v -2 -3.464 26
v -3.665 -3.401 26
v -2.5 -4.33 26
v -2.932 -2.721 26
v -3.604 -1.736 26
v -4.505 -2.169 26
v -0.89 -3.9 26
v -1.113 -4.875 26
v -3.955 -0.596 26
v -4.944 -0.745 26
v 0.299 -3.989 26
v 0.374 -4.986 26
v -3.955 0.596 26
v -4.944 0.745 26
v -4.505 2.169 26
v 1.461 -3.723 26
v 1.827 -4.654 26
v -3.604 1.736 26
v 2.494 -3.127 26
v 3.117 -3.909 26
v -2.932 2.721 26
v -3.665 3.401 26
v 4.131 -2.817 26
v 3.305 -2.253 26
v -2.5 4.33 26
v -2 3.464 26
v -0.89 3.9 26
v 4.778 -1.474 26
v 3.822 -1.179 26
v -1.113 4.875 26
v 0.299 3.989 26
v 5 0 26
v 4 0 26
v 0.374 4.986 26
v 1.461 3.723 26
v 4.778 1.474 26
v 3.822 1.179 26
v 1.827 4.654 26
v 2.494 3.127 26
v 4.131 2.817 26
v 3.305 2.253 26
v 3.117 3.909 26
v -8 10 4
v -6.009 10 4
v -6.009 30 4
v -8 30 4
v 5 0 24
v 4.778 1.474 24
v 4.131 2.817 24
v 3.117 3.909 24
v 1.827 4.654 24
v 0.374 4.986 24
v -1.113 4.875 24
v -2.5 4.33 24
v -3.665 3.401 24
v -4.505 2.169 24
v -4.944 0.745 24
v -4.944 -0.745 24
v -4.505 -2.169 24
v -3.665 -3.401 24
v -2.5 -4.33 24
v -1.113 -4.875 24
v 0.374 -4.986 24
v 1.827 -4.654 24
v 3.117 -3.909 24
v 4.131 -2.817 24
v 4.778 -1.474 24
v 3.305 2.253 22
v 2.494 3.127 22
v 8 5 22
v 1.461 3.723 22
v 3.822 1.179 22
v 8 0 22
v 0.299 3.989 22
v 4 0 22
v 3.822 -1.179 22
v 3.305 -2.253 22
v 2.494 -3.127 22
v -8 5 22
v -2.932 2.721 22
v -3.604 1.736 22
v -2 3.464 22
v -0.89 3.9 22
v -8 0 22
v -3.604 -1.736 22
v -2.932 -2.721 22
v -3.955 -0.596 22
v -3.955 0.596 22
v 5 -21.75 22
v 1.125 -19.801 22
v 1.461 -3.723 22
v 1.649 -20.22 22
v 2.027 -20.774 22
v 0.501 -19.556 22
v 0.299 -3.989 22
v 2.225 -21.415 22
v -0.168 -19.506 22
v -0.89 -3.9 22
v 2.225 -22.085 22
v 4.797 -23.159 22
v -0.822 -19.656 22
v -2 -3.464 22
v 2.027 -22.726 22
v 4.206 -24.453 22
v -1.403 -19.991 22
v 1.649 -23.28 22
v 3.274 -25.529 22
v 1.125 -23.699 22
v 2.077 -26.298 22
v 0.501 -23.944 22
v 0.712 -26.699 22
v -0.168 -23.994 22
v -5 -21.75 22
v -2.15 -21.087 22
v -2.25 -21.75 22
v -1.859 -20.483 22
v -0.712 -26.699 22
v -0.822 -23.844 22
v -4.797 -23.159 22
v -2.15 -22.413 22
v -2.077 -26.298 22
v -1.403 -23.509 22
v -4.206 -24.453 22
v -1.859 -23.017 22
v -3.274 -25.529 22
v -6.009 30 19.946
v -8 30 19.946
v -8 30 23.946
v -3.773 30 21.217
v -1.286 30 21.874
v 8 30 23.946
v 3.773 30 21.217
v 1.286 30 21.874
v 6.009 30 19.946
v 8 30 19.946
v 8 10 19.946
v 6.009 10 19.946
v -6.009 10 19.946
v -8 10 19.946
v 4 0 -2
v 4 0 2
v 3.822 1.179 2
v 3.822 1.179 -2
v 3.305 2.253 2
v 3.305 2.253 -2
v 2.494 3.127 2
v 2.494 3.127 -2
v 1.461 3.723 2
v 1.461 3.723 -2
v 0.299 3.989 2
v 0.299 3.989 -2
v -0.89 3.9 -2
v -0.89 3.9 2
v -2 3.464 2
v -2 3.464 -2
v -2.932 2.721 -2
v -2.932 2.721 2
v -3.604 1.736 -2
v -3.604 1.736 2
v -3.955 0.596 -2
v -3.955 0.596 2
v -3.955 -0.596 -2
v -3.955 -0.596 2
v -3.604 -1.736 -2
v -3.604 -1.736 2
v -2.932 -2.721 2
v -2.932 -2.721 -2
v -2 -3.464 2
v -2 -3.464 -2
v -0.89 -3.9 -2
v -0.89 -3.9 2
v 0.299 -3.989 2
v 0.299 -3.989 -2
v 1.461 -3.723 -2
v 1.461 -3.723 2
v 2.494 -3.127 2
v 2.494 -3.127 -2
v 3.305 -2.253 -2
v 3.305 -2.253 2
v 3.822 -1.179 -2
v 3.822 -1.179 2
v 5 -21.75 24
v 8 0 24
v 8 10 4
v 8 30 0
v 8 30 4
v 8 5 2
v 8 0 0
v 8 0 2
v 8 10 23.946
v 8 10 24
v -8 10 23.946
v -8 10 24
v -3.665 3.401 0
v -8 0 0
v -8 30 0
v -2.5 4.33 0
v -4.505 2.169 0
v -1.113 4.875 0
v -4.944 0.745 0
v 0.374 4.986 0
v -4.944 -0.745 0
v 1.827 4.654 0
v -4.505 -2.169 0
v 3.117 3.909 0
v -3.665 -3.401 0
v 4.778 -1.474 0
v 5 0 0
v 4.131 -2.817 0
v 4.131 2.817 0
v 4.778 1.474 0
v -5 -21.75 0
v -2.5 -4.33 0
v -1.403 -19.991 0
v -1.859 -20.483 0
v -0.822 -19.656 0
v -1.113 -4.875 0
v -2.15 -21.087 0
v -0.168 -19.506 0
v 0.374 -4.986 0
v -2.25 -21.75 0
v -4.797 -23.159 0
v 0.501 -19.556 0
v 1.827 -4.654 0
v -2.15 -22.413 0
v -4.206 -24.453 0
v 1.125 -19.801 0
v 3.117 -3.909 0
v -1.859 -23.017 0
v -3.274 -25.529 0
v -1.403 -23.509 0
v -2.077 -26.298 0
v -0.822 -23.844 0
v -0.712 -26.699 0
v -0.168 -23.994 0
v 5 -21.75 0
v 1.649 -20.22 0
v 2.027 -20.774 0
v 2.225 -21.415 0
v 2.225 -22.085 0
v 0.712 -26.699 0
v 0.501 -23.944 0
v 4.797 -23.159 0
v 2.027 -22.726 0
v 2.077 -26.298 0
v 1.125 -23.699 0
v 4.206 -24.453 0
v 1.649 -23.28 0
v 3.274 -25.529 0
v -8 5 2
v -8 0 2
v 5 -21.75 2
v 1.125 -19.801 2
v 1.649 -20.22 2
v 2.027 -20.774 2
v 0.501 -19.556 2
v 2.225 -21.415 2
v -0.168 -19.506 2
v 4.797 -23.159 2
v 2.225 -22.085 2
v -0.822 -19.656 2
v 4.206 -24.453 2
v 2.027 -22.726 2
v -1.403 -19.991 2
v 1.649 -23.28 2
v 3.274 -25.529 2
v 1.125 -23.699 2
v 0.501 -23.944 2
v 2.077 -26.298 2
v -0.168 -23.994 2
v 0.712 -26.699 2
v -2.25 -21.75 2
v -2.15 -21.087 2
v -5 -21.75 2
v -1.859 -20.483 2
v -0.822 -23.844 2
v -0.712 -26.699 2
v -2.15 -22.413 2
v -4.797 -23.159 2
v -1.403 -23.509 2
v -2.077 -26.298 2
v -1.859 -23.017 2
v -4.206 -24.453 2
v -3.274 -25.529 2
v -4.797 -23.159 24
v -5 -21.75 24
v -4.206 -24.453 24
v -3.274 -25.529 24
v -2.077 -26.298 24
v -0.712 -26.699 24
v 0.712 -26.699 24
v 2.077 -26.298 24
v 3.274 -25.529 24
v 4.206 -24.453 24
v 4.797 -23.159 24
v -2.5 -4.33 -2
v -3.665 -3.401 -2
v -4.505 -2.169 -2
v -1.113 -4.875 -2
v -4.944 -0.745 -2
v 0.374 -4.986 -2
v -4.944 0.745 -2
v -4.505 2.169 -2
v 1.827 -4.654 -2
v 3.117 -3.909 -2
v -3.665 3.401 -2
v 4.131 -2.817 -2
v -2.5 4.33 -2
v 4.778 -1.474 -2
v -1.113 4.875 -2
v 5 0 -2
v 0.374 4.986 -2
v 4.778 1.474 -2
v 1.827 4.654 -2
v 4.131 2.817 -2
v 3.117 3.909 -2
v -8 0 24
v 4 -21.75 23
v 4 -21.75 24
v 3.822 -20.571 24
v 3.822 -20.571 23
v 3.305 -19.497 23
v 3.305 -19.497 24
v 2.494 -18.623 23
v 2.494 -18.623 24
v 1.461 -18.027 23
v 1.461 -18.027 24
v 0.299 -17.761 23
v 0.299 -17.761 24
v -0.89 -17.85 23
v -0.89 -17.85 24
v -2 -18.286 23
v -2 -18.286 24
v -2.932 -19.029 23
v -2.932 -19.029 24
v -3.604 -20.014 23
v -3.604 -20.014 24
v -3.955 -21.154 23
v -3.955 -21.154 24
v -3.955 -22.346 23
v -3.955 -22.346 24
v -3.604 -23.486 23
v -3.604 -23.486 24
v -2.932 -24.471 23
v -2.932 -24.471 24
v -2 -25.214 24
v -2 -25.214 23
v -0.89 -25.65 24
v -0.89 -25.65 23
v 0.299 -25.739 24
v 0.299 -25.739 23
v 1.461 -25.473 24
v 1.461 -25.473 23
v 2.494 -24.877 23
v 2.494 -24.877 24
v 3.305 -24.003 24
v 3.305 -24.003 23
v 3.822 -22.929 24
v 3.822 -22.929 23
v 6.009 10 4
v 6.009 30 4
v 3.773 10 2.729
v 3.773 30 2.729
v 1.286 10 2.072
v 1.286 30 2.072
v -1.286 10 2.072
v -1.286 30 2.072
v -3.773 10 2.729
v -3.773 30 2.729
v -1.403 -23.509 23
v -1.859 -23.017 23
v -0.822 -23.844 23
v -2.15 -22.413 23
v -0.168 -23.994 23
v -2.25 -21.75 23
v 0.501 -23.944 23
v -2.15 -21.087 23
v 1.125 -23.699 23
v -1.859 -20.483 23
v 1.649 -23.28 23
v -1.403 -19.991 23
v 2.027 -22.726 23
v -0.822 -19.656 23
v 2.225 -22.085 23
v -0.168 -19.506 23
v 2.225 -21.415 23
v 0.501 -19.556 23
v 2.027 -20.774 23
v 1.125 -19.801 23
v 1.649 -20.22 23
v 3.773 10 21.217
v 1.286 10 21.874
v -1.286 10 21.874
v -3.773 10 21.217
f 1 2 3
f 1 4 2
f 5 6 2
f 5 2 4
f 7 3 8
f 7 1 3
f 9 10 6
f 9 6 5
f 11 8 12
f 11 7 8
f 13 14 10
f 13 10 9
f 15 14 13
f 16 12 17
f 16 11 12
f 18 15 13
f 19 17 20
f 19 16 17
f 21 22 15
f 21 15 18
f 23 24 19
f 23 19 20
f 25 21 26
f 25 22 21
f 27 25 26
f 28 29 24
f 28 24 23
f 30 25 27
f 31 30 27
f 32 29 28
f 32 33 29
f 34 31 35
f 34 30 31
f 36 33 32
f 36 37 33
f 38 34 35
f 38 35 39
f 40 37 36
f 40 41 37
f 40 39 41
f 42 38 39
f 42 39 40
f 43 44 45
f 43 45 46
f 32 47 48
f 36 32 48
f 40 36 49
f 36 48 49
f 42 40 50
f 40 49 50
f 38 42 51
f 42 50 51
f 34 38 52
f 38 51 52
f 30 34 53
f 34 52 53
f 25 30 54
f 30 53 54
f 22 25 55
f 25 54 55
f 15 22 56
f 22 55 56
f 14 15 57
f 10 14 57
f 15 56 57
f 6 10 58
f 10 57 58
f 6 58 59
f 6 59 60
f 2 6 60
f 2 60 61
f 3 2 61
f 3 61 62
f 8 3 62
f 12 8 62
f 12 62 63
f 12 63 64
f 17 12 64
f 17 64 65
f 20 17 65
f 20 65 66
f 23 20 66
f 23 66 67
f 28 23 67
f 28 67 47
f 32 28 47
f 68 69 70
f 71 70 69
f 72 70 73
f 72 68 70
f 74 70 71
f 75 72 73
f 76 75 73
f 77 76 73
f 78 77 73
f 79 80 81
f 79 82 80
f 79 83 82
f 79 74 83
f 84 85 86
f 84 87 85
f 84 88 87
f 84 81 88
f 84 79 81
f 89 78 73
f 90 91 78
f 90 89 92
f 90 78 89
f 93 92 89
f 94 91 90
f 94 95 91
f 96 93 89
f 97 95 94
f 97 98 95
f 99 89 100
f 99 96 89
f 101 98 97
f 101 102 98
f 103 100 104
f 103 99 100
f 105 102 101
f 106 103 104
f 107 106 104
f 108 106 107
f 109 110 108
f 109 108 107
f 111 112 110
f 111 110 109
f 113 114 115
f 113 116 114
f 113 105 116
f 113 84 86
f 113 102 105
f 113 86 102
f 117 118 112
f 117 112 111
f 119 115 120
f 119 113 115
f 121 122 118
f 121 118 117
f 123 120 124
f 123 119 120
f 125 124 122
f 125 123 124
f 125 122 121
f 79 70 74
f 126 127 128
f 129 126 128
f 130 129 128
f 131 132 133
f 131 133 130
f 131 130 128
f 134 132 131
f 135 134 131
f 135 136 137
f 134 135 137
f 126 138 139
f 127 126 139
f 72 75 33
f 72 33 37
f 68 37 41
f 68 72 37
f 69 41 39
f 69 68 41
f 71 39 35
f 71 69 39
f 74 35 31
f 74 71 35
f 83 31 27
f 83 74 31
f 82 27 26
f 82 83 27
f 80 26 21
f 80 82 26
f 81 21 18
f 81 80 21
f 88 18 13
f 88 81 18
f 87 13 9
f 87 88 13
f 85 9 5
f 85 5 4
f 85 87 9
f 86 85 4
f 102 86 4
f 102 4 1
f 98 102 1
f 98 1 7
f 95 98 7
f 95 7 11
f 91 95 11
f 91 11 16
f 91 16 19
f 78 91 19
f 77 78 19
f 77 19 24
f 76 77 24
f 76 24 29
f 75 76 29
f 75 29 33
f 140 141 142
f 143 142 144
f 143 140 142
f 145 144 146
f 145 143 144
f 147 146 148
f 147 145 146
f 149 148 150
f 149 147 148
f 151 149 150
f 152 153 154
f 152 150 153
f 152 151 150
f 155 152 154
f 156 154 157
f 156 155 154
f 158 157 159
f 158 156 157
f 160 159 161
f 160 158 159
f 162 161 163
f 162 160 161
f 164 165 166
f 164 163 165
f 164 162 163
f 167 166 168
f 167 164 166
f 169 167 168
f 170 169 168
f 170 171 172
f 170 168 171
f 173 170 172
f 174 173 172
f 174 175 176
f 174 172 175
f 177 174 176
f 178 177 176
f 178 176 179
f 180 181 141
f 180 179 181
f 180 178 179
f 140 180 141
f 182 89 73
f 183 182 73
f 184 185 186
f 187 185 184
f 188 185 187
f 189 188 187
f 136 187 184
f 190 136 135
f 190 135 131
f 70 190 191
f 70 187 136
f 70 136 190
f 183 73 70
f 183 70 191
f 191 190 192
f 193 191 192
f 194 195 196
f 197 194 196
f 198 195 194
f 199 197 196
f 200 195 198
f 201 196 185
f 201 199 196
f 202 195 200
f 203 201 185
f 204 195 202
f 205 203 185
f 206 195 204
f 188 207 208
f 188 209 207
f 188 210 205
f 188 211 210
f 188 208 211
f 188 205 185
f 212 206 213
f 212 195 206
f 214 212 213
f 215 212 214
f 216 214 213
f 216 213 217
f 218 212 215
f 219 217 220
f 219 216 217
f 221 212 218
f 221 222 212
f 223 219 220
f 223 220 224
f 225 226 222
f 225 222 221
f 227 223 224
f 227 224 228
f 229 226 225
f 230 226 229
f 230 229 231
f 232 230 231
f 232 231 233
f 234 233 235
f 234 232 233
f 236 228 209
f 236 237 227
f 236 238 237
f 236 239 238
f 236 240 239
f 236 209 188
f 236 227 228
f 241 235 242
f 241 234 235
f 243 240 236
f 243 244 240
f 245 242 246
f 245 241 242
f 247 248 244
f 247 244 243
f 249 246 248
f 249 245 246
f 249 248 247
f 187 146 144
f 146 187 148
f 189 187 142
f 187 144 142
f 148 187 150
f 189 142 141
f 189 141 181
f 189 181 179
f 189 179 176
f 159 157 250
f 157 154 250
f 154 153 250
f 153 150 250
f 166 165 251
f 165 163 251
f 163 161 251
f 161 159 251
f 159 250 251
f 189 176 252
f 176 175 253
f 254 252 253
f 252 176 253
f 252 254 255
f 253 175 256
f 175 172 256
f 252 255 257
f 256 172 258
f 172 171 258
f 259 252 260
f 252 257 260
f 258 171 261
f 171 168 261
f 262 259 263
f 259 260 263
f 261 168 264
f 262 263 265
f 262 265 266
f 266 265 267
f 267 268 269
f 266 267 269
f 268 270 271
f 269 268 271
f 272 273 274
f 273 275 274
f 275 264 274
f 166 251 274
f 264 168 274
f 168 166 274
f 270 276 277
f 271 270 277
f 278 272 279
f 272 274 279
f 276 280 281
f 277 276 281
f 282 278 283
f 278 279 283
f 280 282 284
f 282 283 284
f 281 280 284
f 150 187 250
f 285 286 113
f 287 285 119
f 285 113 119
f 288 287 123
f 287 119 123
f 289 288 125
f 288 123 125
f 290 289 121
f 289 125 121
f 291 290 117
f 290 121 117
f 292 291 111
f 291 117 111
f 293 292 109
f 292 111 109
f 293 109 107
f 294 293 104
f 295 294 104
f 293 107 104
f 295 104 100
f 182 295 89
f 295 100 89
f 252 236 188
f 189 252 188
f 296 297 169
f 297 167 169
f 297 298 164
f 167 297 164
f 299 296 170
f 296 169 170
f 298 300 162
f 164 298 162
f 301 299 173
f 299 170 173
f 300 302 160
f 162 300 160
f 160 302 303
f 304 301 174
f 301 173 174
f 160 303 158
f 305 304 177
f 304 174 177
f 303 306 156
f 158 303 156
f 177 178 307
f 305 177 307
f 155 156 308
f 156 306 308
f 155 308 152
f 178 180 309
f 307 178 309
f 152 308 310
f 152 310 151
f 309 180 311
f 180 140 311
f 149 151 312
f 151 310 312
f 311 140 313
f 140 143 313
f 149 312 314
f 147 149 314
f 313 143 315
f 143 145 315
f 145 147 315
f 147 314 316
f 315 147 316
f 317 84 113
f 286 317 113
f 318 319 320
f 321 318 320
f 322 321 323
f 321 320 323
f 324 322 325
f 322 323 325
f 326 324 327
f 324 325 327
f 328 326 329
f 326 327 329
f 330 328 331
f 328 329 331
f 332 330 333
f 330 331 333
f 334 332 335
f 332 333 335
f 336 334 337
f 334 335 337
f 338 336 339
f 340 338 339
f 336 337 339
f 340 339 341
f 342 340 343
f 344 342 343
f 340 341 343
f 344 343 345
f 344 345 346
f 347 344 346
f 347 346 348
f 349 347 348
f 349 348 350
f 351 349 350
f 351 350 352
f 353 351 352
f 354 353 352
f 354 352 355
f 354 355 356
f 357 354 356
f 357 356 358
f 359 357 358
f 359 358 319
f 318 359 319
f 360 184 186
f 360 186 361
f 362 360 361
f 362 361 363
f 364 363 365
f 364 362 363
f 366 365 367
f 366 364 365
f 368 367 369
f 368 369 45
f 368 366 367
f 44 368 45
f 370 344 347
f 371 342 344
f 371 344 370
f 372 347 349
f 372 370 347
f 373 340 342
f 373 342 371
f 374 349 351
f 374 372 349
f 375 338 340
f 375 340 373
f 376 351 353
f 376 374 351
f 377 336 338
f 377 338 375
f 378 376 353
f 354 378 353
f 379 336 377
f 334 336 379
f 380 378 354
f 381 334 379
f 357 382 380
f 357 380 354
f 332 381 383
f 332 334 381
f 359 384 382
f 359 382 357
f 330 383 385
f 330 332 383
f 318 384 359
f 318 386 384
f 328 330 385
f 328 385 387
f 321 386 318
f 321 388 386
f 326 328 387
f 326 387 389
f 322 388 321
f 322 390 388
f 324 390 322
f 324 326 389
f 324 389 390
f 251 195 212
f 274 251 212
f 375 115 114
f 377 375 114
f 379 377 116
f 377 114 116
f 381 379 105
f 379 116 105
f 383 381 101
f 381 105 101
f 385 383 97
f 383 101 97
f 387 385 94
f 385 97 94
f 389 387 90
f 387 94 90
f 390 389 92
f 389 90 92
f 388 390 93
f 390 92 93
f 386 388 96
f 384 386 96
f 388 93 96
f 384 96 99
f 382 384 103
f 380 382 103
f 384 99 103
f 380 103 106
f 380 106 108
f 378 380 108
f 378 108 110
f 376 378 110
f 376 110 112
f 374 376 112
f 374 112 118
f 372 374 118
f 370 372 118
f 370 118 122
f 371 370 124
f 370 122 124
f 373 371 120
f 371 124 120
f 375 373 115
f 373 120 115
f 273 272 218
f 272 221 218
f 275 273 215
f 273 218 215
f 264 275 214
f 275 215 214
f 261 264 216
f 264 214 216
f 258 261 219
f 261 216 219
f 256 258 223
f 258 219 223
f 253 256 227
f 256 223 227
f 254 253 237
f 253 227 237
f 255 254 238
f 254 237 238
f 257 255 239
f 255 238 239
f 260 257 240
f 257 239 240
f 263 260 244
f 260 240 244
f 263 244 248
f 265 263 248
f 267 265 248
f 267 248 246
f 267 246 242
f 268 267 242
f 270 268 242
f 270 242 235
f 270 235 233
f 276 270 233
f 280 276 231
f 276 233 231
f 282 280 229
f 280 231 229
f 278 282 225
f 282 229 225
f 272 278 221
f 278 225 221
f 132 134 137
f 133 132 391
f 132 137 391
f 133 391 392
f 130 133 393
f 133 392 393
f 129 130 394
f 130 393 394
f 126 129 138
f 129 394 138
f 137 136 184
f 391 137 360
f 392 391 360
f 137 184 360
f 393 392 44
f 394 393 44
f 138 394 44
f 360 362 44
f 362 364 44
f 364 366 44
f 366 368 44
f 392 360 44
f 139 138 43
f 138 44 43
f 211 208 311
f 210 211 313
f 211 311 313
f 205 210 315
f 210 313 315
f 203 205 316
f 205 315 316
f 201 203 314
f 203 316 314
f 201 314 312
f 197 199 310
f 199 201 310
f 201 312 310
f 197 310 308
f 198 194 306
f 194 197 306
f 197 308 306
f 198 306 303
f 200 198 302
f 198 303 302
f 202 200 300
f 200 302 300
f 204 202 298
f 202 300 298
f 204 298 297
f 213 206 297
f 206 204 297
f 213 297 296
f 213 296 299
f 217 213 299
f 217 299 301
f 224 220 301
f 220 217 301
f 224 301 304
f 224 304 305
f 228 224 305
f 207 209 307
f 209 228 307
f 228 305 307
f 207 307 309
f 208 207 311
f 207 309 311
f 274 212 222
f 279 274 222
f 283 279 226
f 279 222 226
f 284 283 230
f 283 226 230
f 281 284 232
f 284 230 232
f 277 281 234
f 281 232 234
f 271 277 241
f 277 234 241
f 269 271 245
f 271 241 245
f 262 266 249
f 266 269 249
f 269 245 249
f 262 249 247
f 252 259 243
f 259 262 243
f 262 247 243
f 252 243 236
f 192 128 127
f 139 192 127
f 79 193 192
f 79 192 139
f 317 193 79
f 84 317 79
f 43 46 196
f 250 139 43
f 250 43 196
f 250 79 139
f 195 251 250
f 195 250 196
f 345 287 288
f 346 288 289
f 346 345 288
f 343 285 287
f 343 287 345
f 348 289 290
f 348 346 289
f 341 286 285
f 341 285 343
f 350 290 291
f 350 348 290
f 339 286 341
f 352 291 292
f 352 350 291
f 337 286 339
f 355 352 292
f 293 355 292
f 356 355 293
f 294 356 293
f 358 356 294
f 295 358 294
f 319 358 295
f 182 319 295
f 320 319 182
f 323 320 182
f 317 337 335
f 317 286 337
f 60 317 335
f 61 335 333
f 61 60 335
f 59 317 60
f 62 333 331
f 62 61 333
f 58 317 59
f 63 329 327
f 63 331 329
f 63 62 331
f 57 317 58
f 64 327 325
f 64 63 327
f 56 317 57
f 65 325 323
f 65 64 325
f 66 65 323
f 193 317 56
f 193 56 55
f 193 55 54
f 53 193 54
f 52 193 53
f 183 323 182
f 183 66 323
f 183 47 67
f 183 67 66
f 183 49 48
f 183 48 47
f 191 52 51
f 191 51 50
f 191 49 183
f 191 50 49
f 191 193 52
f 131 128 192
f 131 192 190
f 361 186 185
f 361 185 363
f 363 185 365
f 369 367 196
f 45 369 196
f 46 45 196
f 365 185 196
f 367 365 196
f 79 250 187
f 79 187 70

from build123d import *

# Parameters (mm, degrees)
SKETCH_4_R                   = 4
EXTRUDE_1_DEPTH              = 24
HOLE_WIZARD_M4_1_D           = 4.5
HOLE_WIZARD_M4_1_CBORE_D     = 8
HOLE_WIZARD_M4_1_CBORE_DEPTH = 1
EXTRUDE_2_DEPTH              = 2
EXTRUDE_2_DEPTH_BACK         = 26
SKETCH_7_R                   = 5
SKETCH_7_R_2                 = 4
EXTRUDE_3_DEPTH              = 20
CUT_EXTRUDE_1_DEPTH          = 20


with BuildPart() as part:
    # 草图4 → 凸台-拉伸1 (new body)
    with BuildSketch(Plane.XY):
        with BuildLine():
            Line((-8, 0), (-5, -21.75))
            ThreePointArc((-5, -21.75), (0, -26.75), (5, -21.75))
            Line((5, -21.75), (8, 0))
            Line((8, 0), (8, 10))
            Line((8, 10), (5, 10))
            Line((5, 10), (-5, 10))
            Line((-5, 10), (-8, 10))
            Line((-8, 10), (-8, 0))
        make_face()
        Circle(SKETCH_4_R, mode=Mode.SUBTRACT)
    extrude(amount=EXTRUDE_1_DEPTH)

    # M4 六角凹头盖的柱孔1 (through all)
    with Locations(Plane(origin=(0, -21.75, 24), x_dir=(1, 0, 0), z_dir=(0, 0, 1))):
        with Locations((0, 0)):
            CounterBoreHole(HOLE_WIZARD_M4_1_D / 2, HOLE_WIZARD_M4_1_CBORE_D / 2, HOLE_WIZARD_M4_1_CBORE_DEPTH)

    # 草图7 → 凸台-拉伸2 (add, two sides: drawn at the far end of the back side and taken through both)
    with BuildSketch(Plane.XY.offset(24).offset(-EXTRUDE_2_DEPTH_BACK)):
        Circle(SKETCH_7_R)
        Circle(SKETCH_7_R_2, mode=Mode.SUBTRACT)
    extrude(amount=EXTRUDE_2_DEPTH + EXTRUDE_2_DEPTH_BACK)

    # 草图8 → 凸台-拉伸3 (add)
    with BuildSketch(Plane(origin=(0, 10, 0), x_dir=(1, 0, 0), z_dir=(0, 1, 0))):
        with BuildLine():
            Line((-8, 0), (8, 0))
            Line((8, 0), (8, -4))
            Line((8, -4), (6.008972597, -4))
            ThreePointArc((6.008972597, -4), (0, -1.989201574), (-6.008972597, -4))
            Line((-6.008972597, -4), (-8, -4))
            Line((-8, -4), (-8, 0))
        make_face()
        with BuildLine():
            Line((8, -23.946124164), (8, -19.946124164))
            Line((8, -19.946124164), (6.008972597, -19.946124164))
            ThreePointArc((6.008972597, -19.946124164), (0, -21.956922589), (-6.008972597, -19.946124164))
            Line((-6.008972597, -19.946124164), (-8, -19.946124164))
            Line((-8, -19.946124164), (-8, -23.946124164))
            Line((-8, -23.946124164), (8, -23.946124164))
        make_face()
    extrude(amount=EXTRUDE_3_DEPTH)

    # 草图9 → 切除-拉伸1 (cut)
    with BuildSketch(Plane.ZY.offset(8)):
        Polygon((2, -27), (2, 0), (2, 5), (22, 5), (22, -27), align=None)
    extrude(amount=-CUT_EXTRUDE_1_DEPTH, mode=Mode.SUBTRACT)


solid = part.part
